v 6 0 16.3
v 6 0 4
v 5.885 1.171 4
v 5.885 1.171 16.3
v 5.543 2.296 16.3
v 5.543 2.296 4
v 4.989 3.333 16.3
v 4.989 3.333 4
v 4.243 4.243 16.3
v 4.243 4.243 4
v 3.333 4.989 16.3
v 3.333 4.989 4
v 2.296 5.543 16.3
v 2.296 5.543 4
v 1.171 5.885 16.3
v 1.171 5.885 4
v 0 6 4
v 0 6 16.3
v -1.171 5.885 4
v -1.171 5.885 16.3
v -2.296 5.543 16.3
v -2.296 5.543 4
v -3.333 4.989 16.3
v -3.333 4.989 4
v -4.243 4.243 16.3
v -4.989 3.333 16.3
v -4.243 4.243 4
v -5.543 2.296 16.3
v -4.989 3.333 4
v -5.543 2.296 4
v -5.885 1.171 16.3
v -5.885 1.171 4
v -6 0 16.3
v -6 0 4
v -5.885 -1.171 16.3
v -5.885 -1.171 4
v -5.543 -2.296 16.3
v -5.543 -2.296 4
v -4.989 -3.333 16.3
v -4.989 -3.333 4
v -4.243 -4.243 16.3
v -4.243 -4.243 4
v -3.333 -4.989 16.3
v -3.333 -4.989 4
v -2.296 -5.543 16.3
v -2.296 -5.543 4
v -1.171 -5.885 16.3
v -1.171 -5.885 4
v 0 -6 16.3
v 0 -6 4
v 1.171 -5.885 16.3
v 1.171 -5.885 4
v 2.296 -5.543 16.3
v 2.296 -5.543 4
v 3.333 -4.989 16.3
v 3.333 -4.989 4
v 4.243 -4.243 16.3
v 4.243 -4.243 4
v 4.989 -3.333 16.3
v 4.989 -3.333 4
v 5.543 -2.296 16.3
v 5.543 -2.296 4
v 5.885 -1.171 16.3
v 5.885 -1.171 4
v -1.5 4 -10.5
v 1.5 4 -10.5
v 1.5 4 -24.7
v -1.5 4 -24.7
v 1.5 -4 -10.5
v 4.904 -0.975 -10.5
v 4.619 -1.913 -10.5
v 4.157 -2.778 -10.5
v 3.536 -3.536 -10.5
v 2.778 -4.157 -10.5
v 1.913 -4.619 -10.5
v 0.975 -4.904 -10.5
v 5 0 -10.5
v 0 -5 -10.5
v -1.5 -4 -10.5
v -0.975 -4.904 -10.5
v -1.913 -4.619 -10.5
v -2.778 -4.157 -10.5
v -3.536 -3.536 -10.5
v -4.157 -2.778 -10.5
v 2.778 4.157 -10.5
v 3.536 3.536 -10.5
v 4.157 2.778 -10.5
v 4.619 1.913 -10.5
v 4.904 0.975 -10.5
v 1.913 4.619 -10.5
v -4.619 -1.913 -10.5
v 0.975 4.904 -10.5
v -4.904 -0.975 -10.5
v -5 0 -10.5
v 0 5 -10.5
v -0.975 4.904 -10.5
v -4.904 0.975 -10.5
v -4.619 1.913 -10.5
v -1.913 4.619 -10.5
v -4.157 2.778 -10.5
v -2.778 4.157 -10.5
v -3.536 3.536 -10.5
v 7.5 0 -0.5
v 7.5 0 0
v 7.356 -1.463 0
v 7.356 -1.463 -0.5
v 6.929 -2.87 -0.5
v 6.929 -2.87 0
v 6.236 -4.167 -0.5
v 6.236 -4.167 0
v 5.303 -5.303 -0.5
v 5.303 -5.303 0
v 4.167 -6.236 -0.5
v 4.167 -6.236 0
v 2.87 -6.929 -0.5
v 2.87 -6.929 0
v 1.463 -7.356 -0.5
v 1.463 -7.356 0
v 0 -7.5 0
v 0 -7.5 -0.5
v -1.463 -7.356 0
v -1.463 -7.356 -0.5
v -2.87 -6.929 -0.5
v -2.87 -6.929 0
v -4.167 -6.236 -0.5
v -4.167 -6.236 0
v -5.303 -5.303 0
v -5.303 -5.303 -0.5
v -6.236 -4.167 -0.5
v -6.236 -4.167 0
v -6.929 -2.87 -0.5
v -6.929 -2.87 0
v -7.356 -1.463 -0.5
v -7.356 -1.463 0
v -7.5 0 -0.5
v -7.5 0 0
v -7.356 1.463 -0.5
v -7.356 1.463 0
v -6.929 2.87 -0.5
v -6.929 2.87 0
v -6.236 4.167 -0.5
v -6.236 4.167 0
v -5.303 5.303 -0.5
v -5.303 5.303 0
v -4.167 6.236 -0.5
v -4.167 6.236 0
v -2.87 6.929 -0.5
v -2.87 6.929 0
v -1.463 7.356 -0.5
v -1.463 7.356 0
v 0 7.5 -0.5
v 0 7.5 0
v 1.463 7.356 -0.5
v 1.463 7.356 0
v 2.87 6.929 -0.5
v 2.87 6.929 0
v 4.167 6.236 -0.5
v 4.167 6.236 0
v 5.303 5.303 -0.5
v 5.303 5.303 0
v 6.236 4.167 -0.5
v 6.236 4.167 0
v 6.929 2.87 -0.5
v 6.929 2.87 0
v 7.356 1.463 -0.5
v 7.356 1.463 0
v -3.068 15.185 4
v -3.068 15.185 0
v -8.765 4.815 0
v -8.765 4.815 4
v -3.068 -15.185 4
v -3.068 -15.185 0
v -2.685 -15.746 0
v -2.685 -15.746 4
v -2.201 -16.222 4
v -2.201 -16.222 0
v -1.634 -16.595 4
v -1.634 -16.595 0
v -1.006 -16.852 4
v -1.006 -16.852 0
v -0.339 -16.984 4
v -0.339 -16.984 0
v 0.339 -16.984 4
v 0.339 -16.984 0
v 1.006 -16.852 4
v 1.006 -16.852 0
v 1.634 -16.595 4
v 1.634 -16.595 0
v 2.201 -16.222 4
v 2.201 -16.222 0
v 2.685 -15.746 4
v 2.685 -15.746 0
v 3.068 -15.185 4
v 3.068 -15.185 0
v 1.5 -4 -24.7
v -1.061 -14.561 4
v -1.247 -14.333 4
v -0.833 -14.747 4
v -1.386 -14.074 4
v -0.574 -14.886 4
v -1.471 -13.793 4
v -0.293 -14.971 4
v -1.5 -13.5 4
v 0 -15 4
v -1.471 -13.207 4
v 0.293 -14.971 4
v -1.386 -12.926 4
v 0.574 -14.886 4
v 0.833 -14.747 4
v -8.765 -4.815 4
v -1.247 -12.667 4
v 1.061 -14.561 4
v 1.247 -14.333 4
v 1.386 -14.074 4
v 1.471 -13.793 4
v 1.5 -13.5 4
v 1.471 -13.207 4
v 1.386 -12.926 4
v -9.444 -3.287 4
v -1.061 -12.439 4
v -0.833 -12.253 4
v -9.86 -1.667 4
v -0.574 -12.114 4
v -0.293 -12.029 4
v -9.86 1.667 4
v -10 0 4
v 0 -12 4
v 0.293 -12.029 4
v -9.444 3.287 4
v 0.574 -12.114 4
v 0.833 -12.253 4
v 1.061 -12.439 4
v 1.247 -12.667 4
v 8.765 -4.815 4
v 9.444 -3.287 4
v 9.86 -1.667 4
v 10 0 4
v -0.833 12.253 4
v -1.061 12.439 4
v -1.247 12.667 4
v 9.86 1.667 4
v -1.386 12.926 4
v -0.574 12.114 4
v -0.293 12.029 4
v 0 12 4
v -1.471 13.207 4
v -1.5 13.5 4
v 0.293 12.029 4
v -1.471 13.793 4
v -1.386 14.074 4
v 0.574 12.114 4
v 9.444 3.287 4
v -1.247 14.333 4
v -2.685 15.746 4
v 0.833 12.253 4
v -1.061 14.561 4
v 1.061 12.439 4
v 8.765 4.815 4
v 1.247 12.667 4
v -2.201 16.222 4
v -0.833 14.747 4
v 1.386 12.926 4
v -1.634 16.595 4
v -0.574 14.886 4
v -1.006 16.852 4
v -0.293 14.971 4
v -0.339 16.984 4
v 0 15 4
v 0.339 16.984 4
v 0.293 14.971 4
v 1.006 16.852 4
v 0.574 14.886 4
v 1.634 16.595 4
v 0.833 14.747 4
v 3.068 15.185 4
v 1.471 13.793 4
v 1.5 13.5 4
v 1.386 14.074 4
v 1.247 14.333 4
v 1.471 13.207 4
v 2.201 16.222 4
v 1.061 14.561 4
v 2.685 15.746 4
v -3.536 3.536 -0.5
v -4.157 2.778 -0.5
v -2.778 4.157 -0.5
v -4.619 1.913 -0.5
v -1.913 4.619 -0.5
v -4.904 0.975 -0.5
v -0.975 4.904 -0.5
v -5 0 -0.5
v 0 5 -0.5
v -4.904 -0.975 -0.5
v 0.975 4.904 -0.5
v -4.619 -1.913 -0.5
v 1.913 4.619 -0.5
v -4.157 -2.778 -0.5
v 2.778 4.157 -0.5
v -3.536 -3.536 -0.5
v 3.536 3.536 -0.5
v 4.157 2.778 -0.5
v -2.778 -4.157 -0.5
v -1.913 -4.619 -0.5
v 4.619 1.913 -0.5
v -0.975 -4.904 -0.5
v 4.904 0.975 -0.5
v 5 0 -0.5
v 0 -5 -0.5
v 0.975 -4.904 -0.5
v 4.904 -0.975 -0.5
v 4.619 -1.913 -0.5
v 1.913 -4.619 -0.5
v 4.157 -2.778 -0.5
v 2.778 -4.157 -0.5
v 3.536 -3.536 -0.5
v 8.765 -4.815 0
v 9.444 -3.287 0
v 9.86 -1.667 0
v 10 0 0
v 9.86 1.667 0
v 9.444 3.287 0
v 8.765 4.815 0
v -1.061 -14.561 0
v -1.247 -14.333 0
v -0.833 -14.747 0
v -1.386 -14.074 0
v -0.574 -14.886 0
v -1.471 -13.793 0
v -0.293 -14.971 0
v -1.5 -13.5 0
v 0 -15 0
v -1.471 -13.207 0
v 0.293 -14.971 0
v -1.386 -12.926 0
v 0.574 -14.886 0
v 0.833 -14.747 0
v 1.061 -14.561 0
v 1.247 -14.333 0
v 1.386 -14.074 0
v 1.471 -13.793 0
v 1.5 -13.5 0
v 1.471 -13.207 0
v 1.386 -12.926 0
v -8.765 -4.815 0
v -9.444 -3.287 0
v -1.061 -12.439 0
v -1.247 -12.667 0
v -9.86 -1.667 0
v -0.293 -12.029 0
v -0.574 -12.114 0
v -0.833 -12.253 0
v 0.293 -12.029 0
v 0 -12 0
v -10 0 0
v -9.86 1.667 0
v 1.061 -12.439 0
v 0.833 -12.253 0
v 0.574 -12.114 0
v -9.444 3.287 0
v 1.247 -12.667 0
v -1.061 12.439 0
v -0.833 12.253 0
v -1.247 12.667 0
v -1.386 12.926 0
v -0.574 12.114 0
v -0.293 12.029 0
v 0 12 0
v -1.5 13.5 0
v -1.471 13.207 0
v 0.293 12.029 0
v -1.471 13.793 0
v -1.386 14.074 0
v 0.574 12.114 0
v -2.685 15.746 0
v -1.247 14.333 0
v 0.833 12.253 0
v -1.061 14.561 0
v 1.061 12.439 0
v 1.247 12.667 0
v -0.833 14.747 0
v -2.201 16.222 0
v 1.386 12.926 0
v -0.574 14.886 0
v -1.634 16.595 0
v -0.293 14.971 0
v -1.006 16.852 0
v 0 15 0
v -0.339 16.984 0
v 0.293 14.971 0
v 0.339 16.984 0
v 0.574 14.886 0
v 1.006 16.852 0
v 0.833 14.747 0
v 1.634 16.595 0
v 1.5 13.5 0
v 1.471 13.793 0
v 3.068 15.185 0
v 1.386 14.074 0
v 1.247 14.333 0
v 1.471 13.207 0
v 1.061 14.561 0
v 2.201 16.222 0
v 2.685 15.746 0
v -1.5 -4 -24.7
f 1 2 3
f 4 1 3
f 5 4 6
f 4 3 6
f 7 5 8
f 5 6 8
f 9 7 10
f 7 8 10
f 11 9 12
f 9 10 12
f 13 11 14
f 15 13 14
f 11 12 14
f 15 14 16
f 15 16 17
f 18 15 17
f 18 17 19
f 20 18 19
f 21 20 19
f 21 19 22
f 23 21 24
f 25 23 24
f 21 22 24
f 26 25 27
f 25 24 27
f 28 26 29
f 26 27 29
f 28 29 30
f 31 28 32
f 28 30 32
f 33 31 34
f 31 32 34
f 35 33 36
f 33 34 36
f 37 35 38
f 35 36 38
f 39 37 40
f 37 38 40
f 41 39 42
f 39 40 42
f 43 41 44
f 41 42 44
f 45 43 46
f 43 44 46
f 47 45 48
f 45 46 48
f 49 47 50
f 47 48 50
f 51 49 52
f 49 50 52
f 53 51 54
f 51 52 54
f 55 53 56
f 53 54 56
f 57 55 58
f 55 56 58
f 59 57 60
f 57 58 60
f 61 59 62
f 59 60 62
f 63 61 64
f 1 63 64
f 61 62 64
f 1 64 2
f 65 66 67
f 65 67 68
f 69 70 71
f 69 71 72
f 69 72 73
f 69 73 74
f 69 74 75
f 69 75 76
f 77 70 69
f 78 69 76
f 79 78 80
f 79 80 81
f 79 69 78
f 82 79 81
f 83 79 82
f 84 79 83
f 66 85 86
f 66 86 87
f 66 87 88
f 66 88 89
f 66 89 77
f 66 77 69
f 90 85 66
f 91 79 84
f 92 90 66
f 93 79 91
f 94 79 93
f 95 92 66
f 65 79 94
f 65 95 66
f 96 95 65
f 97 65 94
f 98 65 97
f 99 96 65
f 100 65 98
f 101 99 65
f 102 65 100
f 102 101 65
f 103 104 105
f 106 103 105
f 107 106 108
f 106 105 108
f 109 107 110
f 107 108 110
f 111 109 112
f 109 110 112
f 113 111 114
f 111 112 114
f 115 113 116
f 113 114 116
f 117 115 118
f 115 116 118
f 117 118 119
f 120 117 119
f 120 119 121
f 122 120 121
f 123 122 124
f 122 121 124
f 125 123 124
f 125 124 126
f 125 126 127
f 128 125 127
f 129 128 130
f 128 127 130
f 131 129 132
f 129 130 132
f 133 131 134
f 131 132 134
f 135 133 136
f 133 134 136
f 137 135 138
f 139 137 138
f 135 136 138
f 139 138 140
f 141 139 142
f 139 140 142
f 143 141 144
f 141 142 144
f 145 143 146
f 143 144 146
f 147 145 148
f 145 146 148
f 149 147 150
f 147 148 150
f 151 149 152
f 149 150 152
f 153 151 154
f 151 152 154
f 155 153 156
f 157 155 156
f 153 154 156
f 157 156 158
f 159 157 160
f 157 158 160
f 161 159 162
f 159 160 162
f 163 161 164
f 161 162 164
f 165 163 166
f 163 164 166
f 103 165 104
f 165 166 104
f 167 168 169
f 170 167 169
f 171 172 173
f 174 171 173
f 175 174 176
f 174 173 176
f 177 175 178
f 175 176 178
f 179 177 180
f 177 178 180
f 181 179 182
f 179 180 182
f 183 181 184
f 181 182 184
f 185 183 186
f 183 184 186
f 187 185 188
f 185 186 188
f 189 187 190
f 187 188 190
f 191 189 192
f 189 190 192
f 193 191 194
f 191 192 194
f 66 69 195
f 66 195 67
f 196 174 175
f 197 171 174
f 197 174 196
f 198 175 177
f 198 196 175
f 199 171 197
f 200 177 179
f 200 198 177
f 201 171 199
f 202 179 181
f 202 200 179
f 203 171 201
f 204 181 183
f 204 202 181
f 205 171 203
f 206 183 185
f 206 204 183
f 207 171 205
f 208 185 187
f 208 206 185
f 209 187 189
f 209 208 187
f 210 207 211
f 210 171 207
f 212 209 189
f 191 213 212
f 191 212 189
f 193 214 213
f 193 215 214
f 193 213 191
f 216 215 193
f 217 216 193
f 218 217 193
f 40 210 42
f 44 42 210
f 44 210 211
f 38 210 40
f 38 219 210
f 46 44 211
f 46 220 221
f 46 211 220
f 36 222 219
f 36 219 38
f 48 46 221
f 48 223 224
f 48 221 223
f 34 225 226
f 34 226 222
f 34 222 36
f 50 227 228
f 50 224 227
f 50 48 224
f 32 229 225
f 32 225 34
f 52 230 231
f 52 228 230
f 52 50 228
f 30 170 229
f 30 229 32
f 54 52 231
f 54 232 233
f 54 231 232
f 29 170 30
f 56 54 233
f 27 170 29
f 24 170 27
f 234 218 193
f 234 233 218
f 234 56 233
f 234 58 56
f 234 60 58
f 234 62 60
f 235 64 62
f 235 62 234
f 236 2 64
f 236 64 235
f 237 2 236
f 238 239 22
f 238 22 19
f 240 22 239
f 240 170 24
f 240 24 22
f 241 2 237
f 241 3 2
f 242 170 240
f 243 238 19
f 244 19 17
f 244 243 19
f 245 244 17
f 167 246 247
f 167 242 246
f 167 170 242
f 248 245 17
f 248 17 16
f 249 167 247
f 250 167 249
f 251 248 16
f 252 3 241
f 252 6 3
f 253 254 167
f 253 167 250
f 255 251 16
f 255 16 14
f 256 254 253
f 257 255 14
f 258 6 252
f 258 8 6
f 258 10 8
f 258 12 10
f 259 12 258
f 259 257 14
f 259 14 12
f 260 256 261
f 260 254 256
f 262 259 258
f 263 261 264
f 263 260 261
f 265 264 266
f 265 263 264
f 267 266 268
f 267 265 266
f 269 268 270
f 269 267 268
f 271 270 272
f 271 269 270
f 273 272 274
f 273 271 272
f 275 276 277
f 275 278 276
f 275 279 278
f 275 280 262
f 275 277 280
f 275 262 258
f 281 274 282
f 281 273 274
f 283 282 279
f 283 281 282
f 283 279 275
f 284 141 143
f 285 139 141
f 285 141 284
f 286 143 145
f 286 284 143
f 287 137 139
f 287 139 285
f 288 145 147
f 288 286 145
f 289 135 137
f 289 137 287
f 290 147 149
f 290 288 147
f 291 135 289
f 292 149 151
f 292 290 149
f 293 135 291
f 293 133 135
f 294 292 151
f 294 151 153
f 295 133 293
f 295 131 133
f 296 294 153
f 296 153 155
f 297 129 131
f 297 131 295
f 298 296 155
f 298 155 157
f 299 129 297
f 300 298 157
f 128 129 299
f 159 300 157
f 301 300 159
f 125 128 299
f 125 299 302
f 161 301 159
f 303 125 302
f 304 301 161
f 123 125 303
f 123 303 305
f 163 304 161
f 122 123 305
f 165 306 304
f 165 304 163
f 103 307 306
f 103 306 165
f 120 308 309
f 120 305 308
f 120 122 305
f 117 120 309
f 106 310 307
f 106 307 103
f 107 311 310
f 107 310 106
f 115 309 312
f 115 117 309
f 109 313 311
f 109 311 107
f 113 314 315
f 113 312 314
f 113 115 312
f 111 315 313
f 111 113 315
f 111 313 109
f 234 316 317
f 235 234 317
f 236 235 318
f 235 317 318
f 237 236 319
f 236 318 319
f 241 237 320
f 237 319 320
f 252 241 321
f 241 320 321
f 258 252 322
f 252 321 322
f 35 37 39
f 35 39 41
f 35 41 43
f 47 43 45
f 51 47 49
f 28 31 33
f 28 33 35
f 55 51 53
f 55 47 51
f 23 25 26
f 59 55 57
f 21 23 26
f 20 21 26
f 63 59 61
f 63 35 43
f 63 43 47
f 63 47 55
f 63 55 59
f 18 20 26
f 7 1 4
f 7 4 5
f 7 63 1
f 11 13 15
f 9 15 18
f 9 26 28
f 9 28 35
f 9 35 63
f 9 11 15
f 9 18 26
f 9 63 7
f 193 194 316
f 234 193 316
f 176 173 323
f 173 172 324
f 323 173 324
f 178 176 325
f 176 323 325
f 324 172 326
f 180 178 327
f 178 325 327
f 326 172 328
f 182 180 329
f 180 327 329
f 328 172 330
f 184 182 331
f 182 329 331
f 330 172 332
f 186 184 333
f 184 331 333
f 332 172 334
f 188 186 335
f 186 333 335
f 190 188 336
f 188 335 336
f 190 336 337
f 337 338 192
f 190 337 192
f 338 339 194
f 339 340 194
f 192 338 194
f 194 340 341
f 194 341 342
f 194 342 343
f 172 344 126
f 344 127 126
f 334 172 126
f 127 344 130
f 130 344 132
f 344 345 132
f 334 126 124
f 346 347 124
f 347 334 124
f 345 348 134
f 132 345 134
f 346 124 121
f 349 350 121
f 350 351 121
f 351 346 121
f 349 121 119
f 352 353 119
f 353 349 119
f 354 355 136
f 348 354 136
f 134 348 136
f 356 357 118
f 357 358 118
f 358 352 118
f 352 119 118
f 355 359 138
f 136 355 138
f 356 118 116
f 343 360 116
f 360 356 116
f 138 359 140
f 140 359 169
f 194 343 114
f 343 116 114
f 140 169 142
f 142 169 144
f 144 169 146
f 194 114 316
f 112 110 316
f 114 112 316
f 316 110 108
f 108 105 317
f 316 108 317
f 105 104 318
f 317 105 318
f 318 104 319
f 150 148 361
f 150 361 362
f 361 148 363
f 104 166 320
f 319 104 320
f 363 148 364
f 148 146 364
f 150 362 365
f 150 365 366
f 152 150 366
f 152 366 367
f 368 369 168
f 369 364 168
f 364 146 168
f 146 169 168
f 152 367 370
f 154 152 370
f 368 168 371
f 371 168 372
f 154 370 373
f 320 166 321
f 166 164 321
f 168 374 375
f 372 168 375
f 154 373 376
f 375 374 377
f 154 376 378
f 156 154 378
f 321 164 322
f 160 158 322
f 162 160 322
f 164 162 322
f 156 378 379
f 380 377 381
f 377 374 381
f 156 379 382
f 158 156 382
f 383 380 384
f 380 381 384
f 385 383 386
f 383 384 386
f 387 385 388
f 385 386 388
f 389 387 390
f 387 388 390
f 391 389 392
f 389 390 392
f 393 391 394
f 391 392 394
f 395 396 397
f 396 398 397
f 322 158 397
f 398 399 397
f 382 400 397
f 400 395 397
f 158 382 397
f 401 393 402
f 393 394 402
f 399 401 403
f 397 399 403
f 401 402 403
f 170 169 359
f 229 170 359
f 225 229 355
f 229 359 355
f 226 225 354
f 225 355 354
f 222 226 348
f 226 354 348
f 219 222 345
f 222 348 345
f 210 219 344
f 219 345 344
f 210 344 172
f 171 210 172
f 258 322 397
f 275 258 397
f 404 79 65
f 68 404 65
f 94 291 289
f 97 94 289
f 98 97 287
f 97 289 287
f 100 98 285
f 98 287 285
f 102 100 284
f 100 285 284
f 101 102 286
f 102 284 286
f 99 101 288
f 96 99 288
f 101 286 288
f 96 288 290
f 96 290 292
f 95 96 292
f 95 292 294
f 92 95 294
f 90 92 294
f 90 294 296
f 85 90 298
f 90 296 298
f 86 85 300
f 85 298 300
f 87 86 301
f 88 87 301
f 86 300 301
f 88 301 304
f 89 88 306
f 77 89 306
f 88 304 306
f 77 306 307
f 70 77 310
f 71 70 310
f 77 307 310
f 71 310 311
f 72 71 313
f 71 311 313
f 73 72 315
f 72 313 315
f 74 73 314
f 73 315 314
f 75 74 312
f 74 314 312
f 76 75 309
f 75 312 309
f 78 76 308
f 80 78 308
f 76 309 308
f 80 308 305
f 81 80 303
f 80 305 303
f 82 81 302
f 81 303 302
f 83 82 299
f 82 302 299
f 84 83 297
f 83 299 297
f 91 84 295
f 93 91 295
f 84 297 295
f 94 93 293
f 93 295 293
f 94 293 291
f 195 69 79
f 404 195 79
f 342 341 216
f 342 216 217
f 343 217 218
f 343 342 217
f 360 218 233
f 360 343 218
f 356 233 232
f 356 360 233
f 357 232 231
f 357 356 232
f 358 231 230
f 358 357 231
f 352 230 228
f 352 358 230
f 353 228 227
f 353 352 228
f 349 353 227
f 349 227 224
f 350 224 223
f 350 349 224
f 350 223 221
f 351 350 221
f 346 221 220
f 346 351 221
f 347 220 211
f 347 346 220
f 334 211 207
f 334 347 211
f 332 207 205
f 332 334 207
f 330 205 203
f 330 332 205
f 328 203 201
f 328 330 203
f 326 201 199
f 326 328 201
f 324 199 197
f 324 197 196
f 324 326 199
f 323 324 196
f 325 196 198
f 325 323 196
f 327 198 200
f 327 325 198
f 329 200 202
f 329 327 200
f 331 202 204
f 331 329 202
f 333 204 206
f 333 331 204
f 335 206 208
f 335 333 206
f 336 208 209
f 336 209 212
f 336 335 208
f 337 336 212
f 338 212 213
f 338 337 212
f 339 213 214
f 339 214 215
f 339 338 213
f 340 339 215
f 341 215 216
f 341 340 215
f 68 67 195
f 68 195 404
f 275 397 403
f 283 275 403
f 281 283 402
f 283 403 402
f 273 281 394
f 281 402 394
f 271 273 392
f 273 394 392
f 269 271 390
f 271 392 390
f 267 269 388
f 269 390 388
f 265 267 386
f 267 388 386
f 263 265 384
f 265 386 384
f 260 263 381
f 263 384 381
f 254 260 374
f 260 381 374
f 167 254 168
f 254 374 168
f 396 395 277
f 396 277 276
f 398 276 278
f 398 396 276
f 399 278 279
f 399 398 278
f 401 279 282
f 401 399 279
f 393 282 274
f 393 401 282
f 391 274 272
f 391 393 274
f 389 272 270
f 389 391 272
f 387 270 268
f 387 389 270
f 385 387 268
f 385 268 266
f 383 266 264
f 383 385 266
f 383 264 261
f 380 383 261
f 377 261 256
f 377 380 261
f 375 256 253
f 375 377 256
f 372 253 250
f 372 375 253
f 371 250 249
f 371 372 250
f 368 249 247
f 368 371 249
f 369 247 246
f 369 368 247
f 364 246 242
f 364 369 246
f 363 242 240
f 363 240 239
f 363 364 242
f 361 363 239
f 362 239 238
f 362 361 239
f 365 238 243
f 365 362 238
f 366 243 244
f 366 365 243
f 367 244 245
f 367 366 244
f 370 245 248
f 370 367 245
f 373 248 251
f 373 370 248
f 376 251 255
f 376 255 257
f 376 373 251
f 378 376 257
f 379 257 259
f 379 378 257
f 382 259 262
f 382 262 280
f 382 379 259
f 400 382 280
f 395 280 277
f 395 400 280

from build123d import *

# Parameters (mm, degrees)
SKETCH1_R           = 3.5
SKETCH1_R_2         = 1.5
SKETCH1_R_3         = 10
BOSS_EXTRUDE1_DEPTH = 4
SKETCH2_R           = 6
BOSS_EXTRUDE2_DEPTH = 12.3
SKETCH3_R           = 7.5
BOSS_EXTRUDE3_DEPTH = 0.5
SKETCH4_W           = 3
SKETCH4_H           = 8
BOSS_EXTRUDE4_DEPTH = 24.2
SKETCH5_R           = 5
BOSS_EXTRUDE5_DEPTH = 10


with BuildPart() as part:
    # Sketch1 → Boss-Extrude1 (new body)
    # profile 1 of 7: a face of its own
    with BuildSketch(Plane.XY):
        with Locations((0, -13.5)):
            Circle(SKETCH1_R)
        with Locations((0, -13.5)):
            Circle(SKETCH1_R_2, mode=Mode.SUBTRACT)
    # profile 2 of 7: a face of its own
    with BuildSketch(Plane.XY):
        with BuildLine():
            ThreePointArc((8.764562642, -4.814814815), (5.091750776, -8.606629656), (9e-09, -10))
            ThreePointArc((9e-09, -10), (2.474873737, -11.025126269), (3.5, -13.5))
            ThreePointArc((3.5, -13.5), (3.390176193, -14.369888143), (3.067596925, -15.185185185))
            Line((3.067596925, -15.185185185), (8.764562642, -4.814814815))
        make_face()
    # profile 3 of 7: a face of its own
    with BuildSketch(Plane.XY):
        Circle(SKETCH1_R_3)
    # profile 4 of 7: a face of its own
    with BuildSketch(Plane.XY):
        with BuildLine():
            Line((8.764562642, 4.814814815), (3.067596925, 15.185185185))
            ThreePointArc((3.067596925, 15.185185185), (3.390176193, 14.369888143), (3.5, 13.5))
            ThreePointArc((3.5, 13.5), (2.474873734, 11.025126266), (0, 10))
            ThreePointArc((0, 10), (5.091750772, 8.606629658), (8.764562642, 4.814814815))
        make_face()
    # profile 5 of 7: a face of its own
    with BuildSketch(Plane.XY):
        with Locations((0, 13.5)):
            Circle(SKETCH1_R)
        with Locations((0, 13.5)):
            Circle(SKETCH1_R_2, mode=Mode.SUBTRACT)
    # profile 6 of 7: a face of its own
    with BuildSketch(Plane.XY):
        with BuildLine():
            ThreePointArc((0, 10), (-3.01232038, 11.71788723), (-3.067596925, 15.185185185))
            Line((-3.067596925, 15.185185185), (-8.764562642, 4.814814815))
            ThreePointArc((-8.764562642, 4.814814815), (-5.091750772, 8.606629658), (0, 10))
        make_face()
    # profile 7 of 7: a face of its own
    with BuildSketch(Plane.XY):
        with BuildLine():
            ThreePointArc((9e-09, -10), (-5.091750768, -8.606629661), (-8.764562642, -4.814814815))
            Line((-8.764562642, -4.814814815), (-3.067596925, -15.185185185))
            ThreePointArc((-3.067596925, -15.185185185), (-3.012320378, -11.717887226), (9e-09, -10))
        make_face()
    extrude(amount=BOSS_EXTRUDE1_DEPTH)

    # Sketch2 → Boss-Extrude2 (add)
    with BuildSketch(Plane.XY.offset(4)):
        Circle(SKETCH2_R)
    extrude(amount=BOSS_EXTRUDE2_DEPTH)

    # Sketch3 → Boss-Extrude3 (add)
    with BuildSketch(Plane(origin=(0, 0, 0), x_dir=(-1, 0, 0), z_dir=(0, 0, -1))):
        with Locations(Location((0, 0, 0), (0, 0, 180))):
            Circle(SKETCH3_R)
    extrude(amount=BOSS_EXTRUDE3_DEPTH)

    # Sketch4 → Boss-Extrude4 (add)
    with BuildSketch(Plane(origin=(0, 0, -0.5), x_dir=(-1, 0, 0), z_dir=(0, 0, -1))):
        Rectangle(SKETCH4_W, SKETCH4_H)
    extrude(amount=BOSS_EXTRUDE4_DEPTH)

    # Sketch5 → Boss-Extrude5 (add)
    with BuildSketch(Plane(origin=(0, 0, -0.5), x_dir=(-1, 0, 0), z_dir=(0, 0, -1))):
        Circle(SKETCH5_R)
    extrude(amount=BOSS_EXTRUDE5_DEPTH)


solid = part.part
